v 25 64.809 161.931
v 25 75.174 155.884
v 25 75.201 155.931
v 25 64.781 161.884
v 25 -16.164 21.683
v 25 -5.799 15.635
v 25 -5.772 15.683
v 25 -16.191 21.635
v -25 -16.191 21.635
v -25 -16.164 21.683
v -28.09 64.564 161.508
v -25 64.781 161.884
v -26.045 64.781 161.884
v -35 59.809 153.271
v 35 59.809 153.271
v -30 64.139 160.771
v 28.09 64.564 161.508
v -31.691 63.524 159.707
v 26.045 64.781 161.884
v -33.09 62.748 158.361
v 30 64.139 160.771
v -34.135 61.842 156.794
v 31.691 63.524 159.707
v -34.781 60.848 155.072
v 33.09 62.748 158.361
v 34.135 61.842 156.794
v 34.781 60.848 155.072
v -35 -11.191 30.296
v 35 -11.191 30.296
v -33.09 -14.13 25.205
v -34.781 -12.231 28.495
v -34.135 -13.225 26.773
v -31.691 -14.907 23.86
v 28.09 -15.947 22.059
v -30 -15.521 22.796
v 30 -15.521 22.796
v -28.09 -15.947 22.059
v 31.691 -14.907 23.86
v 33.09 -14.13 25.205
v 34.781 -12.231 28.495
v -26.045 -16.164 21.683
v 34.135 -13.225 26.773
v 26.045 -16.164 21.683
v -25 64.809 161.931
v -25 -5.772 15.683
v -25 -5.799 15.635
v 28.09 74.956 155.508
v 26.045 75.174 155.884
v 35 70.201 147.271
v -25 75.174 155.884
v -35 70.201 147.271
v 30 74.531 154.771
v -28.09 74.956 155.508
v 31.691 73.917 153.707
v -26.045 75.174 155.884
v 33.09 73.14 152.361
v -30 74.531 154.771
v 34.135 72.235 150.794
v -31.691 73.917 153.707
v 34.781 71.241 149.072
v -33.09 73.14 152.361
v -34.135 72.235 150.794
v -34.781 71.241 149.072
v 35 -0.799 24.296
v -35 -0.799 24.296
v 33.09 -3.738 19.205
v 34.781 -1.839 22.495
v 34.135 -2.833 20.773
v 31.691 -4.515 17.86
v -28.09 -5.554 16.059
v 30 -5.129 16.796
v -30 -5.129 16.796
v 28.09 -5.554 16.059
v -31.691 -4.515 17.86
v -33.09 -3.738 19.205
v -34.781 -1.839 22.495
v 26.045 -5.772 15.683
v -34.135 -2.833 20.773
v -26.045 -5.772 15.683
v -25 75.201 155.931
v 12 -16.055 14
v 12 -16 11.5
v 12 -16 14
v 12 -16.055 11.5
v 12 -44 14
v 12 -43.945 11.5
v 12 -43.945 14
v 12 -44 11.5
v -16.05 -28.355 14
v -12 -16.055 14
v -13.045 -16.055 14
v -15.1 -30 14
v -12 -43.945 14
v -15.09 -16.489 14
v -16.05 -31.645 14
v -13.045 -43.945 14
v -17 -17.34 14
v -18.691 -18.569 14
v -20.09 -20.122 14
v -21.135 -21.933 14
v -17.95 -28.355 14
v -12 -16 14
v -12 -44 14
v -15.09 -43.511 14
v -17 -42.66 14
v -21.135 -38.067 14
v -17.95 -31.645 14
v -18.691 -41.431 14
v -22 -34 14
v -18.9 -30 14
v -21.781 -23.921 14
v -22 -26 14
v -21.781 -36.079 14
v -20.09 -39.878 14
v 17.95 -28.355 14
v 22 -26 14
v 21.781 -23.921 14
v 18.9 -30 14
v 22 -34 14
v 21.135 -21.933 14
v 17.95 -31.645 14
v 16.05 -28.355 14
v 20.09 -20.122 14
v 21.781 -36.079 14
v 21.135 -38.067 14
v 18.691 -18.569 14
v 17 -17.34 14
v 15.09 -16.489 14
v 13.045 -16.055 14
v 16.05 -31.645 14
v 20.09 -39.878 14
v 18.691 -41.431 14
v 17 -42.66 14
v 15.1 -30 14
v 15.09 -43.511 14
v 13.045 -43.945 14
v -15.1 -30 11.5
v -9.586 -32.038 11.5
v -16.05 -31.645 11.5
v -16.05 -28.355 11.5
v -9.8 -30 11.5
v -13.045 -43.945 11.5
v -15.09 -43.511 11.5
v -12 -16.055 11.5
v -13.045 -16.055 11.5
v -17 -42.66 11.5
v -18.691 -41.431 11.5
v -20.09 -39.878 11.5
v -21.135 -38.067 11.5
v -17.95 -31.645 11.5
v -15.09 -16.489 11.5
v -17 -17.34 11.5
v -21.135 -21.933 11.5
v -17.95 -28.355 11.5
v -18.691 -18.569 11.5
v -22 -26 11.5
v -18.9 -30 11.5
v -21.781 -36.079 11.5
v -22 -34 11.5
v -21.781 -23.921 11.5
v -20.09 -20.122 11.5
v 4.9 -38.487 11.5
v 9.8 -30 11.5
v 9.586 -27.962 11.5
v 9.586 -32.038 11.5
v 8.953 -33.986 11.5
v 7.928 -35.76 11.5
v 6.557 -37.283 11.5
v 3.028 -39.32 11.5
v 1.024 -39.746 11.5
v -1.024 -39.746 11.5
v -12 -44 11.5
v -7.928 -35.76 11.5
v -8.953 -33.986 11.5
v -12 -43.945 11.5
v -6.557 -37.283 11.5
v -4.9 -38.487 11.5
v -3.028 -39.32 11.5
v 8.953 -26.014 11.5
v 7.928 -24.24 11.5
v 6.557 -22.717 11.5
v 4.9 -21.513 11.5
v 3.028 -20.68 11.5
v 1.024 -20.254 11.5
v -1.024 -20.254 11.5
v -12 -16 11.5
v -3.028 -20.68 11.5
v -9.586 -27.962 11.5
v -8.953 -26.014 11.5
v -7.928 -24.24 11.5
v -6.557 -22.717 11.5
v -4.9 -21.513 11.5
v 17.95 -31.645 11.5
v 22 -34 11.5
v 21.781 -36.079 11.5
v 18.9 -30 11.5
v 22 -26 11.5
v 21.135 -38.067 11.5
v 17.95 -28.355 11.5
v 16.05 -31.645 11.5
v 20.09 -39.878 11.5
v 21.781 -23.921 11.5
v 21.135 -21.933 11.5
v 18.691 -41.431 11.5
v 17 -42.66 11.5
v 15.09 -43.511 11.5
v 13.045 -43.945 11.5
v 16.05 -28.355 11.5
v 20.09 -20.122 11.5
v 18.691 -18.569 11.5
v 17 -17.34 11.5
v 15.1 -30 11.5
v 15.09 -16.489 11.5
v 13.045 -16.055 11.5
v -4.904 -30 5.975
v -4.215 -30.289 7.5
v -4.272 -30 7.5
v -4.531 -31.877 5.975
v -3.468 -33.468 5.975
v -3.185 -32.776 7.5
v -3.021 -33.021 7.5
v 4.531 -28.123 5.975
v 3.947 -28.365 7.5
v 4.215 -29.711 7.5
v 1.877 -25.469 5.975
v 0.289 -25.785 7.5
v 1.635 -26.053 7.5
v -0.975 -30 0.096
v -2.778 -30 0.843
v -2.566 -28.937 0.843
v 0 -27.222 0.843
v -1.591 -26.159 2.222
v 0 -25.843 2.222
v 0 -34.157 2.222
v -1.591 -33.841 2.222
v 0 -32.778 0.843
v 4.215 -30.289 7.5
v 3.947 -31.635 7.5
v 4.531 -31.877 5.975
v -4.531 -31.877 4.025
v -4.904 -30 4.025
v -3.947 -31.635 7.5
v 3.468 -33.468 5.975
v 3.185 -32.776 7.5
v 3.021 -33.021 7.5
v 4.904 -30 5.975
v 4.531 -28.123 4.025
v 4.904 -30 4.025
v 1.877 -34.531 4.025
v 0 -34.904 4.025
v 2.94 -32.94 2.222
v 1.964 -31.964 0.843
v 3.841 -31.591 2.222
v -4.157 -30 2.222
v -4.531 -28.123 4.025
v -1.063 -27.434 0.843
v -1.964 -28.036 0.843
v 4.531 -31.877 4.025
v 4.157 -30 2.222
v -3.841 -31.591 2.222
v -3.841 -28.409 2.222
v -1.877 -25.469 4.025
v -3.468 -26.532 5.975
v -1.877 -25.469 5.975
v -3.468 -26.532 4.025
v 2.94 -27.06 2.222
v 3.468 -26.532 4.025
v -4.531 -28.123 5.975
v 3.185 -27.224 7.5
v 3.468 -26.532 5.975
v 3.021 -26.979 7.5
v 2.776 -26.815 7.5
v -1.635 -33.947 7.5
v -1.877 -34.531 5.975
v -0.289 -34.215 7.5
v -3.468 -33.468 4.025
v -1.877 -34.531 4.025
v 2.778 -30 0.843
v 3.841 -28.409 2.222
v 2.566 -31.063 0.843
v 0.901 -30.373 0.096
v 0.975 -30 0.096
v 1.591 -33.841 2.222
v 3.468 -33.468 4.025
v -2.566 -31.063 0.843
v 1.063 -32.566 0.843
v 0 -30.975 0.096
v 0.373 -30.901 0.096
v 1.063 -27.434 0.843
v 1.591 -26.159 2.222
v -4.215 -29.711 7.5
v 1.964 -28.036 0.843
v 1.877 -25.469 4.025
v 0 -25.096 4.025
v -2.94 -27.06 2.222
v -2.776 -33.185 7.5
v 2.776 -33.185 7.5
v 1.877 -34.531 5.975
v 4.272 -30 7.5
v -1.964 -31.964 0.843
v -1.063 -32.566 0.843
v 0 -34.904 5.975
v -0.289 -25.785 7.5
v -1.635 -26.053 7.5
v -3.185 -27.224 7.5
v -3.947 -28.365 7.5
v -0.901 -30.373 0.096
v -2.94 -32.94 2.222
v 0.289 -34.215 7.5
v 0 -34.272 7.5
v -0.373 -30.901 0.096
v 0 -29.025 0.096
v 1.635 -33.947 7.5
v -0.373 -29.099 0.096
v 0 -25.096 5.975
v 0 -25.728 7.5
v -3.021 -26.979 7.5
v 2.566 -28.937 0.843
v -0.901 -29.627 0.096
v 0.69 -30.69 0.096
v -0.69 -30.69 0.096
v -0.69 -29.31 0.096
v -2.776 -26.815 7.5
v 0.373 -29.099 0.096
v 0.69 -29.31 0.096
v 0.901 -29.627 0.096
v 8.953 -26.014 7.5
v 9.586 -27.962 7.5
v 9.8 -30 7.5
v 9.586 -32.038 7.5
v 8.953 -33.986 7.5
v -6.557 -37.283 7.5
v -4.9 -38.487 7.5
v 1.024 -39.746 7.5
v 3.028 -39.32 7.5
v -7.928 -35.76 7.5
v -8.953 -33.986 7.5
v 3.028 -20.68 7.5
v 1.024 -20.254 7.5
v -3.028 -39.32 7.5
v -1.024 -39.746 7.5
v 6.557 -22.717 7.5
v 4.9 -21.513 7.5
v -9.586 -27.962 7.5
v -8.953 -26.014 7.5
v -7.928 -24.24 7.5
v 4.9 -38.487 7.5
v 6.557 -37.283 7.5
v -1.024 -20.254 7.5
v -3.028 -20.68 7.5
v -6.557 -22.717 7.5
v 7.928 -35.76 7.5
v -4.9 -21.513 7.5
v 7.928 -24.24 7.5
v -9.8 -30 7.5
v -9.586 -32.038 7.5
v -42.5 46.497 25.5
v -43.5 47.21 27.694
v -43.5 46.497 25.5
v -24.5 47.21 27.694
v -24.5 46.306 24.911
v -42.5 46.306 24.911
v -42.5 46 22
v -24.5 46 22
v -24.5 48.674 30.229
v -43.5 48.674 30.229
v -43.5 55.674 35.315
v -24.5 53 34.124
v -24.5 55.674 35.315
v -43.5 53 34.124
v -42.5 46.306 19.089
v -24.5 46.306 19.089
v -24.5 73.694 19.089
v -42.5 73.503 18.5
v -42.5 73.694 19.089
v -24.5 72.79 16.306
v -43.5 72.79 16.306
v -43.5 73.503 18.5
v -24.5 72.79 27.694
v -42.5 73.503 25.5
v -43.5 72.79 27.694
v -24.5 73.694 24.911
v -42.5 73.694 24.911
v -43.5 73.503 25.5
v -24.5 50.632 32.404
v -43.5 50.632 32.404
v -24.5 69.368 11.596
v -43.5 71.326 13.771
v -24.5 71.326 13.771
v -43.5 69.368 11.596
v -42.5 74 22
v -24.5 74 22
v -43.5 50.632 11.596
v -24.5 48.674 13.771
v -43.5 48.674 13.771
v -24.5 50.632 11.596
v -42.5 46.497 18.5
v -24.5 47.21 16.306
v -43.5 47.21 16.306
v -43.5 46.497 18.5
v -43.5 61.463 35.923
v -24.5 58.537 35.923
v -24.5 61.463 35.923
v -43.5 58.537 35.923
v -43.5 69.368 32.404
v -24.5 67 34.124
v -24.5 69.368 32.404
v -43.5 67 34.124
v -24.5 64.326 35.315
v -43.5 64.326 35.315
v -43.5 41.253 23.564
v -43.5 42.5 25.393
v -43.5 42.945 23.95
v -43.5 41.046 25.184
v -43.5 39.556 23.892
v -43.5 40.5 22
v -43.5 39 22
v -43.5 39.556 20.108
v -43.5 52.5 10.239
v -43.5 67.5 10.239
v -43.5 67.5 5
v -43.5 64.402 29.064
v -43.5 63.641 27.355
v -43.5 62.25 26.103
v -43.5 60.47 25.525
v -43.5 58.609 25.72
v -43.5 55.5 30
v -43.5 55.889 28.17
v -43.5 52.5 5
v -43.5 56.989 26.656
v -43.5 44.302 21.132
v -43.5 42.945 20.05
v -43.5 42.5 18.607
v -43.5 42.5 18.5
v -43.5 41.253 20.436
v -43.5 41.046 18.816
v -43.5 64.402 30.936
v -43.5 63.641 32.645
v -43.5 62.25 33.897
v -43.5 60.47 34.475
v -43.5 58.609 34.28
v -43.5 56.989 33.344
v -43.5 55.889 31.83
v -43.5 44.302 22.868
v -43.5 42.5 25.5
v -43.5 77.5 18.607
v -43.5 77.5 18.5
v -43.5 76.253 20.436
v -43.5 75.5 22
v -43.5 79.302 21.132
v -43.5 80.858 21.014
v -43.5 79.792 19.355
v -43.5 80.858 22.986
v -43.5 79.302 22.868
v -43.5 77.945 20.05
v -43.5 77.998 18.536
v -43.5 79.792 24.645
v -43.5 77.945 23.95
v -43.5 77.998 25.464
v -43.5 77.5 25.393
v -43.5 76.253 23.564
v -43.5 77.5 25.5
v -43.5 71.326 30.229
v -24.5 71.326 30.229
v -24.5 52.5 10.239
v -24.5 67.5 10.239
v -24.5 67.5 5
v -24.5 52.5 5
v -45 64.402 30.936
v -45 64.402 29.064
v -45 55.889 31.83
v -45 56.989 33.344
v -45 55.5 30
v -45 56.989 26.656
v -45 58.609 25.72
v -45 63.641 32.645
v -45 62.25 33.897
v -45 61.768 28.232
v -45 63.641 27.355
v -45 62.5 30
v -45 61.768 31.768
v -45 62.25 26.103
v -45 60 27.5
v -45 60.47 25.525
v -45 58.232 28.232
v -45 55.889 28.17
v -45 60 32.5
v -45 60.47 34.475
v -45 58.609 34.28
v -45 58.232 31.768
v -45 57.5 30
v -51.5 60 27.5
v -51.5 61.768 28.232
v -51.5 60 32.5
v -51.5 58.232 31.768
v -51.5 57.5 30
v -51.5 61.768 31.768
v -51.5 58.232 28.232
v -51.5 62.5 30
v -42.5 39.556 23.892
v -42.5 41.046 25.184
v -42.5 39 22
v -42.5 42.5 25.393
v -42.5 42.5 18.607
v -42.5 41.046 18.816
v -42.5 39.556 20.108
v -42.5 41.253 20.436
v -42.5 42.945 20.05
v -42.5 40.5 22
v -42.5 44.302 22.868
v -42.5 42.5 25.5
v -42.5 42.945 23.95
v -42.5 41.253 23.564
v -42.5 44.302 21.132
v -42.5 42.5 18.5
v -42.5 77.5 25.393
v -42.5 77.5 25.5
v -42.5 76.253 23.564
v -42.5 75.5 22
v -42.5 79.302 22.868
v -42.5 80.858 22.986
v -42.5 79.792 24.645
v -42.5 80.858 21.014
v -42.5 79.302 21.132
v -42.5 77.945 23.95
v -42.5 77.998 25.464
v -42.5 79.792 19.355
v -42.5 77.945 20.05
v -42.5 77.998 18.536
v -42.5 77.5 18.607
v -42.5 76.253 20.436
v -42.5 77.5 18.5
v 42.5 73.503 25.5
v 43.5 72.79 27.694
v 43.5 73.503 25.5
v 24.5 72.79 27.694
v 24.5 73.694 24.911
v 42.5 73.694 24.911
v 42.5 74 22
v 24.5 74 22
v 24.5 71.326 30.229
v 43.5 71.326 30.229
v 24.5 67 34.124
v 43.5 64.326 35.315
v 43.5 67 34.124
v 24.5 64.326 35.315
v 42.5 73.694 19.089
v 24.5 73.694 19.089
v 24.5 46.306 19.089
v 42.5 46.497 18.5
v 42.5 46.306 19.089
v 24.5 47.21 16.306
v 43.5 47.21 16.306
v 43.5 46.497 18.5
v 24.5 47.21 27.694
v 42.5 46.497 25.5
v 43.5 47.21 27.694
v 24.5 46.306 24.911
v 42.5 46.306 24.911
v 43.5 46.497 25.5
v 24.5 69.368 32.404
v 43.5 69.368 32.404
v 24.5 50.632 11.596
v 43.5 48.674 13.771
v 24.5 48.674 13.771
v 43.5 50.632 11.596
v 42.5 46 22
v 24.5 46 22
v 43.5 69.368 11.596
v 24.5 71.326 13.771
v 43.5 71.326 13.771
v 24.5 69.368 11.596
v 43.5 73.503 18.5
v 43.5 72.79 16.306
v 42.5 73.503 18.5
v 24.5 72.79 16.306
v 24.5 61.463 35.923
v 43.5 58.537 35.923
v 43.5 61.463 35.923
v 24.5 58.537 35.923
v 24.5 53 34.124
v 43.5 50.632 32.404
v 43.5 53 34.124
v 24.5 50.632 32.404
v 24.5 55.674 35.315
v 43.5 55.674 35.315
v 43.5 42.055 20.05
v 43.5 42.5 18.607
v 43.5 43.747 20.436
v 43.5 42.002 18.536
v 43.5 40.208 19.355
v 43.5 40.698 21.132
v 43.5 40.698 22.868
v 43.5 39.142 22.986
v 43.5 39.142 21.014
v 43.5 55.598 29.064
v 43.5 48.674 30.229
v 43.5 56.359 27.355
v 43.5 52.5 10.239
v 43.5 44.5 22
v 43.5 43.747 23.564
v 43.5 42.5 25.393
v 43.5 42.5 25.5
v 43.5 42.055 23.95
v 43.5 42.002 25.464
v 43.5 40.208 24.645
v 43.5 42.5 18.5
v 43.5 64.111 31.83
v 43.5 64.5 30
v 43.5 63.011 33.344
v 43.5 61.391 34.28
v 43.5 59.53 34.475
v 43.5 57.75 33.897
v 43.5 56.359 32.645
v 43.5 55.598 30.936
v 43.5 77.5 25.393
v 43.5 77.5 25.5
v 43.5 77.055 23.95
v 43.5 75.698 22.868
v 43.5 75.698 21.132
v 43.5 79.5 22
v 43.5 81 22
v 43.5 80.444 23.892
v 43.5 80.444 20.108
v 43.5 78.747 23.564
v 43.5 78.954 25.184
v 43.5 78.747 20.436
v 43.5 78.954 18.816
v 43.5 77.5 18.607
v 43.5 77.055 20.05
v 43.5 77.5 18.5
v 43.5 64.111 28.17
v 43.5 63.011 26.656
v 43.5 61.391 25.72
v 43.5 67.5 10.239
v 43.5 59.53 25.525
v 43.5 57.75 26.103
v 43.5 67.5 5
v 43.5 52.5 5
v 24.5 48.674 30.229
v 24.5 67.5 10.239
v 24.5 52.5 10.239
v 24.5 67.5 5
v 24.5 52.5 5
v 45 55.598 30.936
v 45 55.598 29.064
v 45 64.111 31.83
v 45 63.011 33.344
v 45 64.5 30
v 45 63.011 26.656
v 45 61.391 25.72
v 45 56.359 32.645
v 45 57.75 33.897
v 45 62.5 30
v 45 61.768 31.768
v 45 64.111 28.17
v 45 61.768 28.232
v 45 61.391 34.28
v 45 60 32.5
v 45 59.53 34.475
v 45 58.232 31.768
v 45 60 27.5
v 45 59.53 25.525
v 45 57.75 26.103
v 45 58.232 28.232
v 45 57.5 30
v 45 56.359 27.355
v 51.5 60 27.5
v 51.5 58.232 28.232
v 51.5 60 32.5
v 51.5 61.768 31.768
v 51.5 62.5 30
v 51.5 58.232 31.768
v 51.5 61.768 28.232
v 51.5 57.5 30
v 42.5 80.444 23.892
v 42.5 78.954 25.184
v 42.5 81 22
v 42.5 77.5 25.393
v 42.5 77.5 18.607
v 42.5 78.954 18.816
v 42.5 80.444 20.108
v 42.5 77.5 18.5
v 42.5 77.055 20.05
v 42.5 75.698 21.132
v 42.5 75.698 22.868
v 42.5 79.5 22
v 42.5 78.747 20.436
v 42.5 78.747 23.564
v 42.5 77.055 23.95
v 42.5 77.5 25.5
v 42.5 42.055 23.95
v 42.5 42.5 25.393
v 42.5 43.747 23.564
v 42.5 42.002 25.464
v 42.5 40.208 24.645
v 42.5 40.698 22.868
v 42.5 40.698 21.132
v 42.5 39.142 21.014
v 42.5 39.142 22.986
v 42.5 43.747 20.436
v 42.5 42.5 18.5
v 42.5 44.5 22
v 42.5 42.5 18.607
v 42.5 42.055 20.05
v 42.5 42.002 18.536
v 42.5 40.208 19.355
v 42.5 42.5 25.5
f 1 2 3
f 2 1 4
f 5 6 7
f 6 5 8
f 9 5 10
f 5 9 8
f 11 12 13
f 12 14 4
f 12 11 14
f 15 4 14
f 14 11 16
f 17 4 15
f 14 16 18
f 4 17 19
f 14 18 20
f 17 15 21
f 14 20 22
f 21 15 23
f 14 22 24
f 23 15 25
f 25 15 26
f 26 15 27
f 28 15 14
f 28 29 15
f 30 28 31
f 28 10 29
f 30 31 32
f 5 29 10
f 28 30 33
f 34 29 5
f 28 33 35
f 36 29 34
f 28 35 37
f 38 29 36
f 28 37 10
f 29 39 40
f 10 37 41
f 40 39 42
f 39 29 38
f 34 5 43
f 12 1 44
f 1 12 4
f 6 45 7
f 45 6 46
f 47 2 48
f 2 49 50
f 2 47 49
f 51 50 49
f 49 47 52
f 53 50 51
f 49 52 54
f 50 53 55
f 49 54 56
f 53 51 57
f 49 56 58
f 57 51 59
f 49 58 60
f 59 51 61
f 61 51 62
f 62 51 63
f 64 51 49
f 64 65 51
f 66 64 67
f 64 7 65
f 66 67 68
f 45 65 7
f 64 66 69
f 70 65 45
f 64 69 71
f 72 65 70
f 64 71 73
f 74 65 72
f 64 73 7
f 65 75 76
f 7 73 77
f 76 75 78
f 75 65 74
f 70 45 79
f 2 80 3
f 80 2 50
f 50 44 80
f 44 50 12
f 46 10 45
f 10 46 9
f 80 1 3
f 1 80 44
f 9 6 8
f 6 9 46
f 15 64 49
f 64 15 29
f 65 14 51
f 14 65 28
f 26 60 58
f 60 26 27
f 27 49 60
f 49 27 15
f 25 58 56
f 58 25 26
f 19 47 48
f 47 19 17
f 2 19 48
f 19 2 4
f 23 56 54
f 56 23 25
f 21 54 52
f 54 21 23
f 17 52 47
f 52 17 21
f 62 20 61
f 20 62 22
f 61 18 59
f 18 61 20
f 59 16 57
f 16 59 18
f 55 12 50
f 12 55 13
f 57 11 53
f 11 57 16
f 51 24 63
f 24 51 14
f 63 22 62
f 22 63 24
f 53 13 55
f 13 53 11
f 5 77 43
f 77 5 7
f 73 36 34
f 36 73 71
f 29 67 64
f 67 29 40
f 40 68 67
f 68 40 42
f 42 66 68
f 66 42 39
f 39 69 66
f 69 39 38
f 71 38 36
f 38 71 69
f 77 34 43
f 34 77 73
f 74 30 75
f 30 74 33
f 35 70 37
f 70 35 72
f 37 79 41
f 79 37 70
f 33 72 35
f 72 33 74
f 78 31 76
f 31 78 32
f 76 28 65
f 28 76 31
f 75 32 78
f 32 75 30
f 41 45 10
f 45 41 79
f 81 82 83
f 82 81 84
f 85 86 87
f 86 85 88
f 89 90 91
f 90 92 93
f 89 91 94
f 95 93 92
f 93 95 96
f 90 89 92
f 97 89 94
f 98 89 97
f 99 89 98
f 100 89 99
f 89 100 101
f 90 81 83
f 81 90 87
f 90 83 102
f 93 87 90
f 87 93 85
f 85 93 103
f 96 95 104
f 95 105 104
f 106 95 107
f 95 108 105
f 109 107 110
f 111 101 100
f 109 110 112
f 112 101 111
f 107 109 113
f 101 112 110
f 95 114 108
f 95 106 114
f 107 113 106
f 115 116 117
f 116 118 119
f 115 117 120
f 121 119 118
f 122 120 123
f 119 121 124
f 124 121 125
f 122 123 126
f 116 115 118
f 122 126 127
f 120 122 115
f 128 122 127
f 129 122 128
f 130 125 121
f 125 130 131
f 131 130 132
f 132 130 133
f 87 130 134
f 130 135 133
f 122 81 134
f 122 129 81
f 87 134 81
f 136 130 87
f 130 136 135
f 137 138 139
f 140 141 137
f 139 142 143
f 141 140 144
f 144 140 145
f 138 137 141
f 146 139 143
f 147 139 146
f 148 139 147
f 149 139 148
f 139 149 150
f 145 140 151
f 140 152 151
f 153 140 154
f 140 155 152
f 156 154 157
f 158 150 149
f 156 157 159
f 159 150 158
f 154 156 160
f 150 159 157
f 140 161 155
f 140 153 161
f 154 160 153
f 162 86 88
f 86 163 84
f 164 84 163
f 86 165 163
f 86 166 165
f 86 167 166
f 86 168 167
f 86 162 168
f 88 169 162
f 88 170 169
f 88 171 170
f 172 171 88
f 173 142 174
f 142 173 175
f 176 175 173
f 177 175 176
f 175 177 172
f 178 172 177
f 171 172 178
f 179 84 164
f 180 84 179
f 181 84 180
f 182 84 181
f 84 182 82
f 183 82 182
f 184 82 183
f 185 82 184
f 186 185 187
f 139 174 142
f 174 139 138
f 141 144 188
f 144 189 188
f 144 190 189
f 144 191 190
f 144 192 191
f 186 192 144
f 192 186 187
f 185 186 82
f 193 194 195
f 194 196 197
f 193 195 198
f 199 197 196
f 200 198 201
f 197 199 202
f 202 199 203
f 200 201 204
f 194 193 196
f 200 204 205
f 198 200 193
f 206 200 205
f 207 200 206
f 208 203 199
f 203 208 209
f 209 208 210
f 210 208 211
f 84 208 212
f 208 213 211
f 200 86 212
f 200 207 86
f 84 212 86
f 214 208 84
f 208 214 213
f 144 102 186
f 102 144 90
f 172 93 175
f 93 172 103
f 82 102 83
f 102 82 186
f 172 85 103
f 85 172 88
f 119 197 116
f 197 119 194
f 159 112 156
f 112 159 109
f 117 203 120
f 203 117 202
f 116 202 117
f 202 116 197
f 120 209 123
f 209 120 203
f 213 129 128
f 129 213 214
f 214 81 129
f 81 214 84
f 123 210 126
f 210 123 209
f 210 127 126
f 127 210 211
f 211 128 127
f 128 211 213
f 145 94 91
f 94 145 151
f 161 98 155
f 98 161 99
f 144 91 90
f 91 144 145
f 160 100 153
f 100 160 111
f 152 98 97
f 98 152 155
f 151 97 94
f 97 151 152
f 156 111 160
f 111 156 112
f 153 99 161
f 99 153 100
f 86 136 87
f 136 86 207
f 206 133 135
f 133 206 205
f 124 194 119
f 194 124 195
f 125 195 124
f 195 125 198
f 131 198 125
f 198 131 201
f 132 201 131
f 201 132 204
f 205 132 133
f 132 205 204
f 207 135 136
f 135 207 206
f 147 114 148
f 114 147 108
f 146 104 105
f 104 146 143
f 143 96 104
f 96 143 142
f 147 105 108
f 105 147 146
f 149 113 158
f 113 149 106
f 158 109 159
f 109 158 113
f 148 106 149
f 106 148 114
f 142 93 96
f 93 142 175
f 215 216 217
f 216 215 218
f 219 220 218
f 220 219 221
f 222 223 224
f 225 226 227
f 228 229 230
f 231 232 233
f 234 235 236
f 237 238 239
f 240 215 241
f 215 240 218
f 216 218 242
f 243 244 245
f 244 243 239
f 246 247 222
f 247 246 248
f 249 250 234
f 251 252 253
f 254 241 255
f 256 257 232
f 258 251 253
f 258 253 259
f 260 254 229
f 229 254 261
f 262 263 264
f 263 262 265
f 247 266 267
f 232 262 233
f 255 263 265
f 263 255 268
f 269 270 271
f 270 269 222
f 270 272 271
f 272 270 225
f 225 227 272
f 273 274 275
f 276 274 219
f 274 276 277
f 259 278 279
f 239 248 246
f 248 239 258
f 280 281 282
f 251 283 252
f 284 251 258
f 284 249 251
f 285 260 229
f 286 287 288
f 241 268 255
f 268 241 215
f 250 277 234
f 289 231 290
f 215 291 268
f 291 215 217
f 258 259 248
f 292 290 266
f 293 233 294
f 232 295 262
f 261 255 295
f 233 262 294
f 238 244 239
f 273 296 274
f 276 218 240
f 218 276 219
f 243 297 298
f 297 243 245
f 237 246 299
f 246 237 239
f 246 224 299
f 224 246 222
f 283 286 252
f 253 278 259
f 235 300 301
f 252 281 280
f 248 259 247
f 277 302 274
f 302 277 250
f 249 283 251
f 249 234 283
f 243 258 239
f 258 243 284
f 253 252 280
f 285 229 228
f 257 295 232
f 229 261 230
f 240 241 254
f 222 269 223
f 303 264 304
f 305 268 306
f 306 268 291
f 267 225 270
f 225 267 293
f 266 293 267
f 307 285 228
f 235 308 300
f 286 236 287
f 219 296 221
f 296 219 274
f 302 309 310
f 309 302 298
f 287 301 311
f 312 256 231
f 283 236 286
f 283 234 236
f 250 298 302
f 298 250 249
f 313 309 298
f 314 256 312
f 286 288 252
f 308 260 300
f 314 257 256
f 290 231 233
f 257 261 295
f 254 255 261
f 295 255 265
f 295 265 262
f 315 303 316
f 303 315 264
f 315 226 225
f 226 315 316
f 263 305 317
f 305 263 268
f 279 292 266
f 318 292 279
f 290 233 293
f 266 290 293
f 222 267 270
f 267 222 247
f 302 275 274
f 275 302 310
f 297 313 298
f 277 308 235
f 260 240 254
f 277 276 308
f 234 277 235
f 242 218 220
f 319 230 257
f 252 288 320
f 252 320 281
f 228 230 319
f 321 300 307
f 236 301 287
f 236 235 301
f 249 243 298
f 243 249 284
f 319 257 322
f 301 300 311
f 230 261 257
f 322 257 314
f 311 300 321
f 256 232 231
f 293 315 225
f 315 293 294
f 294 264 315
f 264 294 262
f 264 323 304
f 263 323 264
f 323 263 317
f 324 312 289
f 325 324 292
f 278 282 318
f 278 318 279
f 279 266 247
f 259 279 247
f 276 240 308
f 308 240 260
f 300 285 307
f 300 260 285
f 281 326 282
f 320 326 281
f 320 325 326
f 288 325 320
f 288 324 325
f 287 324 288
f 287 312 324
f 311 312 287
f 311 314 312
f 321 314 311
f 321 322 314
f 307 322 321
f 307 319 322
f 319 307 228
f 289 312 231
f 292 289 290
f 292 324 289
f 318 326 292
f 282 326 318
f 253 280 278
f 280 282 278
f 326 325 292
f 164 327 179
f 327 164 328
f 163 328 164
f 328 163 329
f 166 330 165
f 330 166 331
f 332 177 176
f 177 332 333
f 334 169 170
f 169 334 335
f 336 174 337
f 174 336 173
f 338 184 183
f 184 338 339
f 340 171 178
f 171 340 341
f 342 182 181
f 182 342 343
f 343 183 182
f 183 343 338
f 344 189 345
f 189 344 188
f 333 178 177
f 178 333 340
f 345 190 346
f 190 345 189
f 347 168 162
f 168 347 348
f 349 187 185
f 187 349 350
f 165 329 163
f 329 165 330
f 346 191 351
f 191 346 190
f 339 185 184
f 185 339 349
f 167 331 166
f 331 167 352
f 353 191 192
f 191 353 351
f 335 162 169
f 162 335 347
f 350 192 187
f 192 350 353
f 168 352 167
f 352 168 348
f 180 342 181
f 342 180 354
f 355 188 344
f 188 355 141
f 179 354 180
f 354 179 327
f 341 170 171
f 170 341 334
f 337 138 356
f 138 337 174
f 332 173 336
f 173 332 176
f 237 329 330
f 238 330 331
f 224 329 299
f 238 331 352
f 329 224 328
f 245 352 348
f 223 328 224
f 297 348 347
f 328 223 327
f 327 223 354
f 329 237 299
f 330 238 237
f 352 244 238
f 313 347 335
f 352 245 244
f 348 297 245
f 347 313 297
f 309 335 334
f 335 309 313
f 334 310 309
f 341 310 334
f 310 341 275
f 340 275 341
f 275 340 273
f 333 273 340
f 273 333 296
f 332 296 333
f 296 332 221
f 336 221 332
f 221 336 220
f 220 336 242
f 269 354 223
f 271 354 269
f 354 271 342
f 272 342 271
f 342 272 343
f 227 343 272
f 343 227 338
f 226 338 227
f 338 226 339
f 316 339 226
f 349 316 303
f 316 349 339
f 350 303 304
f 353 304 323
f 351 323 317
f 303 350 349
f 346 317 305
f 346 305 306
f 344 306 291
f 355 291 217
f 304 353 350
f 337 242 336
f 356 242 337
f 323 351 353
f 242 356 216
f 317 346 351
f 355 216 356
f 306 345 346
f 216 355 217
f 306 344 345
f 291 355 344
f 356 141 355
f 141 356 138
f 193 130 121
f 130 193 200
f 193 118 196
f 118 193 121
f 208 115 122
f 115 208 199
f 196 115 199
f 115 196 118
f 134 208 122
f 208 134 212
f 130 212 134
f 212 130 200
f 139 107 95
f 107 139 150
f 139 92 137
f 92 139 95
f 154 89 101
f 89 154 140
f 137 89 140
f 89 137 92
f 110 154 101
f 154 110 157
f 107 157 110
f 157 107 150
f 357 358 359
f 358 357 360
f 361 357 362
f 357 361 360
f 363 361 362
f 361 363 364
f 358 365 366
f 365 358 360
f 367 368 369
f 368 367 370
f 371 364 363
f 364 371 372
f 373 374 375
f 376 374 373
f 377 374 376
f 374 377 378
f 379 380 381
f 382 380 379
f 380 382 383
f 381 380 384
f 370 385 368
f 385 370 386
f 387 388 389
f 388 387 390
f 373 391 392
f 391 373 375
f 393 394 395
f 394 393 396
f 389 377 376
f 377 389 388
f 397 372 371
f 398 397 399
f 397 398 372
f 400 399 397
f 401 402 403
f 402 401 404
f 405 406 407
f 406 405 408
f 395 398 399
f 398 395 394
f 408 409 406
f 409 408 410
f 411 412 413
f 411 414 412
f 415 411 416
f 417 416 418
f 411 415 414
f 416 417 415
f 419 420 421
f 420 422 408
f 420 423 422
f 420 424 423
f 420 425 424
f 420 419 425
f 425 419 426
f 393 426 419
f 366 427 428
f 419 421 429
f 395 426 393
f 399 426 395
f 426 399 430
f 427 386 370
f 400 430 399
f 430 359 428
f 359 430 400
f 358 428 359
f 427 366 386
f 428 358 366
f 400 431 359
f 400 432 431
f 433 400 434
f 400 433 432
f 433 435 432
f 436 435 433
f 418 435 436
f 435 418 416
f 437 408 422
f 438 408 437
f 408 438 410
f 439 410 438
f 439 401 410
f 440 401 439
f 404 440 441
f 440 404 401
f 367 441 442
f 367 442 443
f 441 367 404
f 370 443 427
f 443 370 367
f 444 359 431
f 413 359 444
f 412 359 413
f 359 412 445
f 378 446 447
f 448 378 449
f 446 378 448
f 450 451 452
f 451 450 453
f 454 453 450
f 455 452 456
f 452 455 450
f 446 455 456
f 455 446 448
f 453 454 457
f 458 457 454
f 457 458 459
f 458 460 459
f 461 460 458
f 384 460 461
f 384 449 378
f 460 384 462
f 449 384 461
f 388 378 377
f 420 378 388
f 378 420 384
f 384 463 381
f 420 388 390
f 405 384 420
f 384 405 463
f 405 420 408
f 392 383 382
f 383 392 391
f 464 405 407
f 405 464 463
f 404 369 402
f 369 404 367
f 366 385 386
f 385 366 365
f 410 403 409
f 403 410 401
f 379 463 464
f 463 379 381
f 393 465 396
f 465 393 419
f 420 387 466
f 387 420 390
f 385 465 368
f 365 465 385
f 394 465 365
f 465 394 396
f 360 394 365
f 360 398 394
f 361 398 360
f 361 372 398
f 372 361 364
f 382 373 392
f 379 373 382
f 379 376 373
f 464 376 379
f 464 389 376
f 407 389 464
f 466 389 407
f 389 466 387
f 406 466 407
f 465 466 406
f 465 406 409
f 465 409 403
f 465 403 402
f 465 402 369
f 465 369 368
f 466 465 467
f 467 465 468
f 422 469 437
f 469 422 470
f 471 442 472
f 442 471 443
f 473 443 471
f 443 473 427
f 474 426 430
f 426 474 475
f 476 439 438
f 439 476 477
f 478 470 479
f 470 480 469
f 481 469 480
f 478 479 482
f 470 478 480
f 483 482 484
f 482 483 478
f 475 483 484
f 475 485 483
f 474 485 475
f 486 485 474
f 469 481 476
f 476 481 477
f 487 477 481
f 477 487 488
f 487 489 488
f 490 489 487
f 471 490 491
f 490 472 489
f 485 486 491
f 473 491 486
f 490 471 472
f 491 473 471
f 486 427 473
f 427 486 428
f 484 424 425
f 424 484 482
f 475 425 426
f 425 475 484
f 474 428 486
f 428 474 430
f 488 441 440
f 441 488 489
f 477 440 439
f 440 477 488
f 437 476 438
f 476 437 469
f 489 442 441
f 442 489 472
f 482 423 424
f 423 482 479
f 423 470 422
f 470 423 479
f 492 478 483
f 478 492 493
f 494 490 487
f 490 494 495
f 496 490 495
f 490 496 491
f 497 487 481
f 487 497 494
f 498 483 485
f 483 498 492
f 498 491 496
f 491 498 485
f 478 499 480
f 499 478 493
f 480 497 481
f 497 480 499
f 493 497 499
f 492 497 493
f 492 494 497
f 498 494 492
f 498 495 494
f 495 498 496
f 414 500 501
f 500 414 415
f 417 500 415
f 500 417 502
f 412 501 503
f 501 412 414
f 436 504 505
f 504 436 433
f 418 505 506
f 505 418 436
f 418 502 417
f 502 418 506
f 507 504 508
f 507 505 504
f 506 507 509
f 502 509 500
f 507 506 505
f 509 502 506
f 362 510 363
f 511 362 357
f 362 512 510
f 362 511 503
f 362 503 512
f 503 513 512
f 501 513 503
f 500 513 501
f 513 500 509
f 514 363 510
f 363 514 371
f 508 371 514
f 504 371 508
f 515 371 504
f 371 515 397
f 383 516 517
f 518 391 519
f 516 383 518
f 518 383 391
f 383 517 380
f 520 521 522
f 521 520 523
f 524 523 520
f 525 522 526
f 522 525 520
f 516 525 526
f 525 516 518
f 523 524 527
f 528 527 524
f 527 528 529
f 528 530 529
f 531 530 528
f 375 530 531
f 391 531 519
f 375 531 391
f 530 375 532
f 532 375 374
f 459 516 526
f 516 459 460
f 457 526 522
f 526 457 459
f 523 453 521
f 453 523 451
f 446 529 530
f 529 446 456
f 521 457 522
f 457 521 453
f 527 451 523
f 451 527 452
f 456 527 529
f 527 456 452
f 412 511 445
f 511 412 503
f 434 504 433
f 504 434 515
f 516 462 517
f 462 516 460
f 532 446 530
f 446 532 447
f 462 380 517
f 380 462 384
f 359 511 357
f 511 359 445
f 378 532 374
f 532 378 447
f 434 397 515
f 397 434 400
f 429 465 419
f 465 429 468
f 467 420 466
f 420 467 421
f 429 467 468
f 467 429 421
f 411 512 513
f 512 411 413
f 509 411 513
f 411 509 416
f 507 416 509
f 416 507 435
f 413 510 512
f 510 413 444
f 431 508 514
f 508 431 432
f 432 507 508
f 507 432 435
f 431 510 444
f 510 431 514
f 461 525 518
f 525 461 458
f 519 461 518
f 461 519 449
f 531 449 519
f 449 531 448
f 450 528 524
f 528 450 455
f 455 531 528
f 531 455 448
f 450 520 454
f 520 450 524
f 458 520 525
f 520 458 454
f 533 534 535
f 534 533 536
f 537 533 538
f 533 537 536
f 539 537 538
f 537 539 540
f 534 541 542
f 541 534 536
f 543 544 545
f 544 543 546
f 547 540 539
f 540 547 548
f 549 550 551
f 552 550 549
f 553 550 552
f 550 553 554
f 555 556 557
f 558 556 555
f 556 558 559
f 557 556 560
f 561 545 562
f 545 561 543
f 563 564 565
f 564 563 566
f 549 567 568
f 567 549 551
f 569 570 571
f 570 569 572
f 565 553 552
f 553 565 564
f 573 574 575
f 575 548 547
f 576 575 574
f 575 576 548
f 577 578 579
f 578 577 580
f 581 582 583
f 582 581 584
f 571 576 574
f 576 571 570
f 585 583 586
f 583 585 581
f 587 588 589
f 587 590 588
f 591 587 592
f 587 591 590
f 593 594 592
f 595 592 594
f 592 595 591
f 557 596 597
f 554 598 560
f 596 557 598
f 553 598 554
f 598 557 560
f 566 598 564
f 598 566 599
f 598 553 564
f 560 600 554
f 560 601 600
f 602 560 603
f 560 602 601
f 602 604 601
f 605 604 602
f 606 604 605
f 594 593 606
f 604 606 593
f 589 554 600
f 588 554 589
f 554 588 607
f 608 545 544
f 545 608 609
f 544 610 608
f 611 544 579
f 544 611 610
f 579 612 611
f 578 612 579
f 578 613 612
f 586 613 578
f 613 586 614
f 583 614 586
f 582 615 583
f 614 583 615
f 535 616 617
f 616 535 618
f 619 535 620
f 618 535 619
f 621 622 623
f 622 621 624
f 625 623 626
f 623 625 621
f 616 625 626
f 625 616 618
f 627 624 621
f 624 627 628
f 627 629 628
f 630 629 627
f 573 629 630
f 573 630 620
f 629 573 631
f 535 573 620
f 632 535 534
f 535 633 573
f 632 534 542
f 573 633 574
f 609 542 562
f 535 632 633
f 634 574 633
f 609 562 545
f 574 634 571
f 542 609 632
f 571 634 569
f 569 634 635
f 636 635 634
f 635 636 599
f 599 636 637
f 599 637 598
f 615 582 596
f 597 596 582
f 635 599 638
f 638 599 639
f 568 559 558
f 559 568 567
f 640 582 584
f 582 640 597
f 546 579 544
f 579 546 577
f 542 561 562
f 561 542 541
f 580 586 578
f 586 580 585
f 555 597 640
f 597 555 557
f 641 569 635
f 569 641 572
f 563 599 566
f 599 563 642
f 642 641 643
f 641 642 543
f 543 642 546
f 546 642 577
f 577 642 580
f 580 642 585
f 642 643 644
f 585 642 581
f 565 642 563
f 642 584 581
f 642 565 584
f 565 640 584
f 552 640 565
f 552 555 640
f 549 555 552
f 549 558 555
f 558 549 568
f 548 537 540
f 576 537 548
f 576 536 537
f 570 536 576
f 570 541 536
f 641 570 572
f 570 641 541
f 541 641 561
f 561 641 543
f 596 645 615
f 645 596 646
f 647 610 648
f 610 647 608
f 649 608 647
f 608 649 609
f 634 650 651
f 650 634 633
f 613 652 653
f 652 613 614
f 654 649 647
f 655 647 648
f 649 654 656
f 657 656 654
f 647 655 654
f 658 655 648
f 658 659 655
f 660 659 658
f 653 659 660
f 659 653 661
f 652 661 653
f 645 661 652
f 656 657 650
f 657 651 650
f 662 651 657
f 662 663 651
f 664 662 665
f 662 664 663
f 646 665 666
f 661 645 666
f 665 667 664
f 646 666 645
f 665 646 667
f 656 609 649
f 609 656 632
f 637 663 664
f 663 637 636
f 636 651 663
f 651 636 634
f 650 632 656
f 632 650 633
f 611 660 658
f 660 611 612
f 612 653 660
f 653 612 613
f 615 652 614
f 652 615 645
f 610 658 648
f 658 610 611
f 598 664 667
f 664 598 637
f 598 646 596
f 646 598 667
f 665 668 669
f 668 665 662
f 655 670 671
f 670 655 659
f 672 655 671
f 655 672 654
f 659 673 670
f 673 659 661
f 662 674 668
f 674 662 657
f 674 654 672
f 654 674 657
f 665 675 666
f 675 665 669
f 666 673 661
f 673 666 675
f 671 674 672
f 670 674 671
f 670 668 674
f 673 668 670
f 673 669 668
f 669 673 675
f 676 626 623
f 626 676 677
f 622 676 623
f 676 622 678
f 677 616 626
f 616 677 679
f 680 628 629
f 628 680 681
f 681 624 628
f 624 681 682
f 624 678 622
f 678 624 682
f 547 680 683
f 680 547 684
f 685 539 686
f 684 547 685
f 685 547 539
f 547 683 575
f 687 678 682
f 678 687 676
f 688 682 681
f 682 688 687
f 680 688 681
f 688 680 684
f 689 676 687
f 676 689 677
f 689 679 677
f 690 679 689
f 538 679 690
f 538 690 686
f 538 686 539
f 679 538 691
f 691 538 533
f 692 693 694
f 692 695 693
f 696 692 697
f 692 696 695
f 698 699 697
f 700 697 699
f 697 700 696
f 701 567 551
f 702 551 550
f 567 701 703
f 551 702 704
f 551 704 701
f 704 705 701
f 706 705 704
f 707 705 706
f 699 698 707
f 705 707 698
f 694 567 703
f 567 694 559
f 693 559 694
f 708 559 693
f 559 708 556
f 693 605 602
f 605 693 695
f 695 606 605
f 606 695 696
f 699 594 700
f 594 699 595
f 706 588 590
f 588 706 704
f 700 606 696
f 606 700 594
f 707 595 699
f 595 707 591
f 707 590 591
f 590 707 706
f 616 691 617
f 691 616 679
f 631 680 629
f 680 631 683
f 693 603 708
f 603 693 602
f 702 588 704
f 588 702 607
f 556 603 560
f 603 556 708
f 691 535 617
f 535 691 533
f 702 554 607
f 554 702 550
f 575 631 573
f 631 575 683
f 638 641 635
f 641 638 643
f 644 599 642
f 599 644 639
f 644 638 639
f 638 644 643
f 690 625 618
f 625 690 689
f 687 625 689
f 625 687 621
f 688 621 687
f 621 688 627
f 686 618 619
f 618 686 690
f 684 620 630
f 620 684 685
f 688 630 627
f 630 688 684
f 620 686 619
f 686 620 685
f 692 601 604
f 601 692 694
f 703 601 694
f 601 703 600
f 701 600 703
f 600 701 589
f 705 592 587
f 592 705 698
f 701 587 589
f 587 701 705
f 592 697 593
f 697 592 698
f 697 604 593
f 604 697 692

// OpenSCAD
 // centered rounded rect
 module roundedrect(x,y,r,t) {
   ix = x/2 - r;
   iy = y/2 - r;
   union() {
    translate([0,0,0]) cube([x-r*2,y,t], center=true);
    translate([0,0,0]) cube([x,y-r*2,t], center=true);
    translate([ix,iy,0]) cylinder(r=r,h=t, center=true);
    translate([-ix,iy,0]) cylinder(r=r,h=t, center=true);
    translate([ix,-iy,0]) cylinder(r=r,h=t, center=true);
    translate([-ix,-iy,0]) cylinder(r=r,h=t, center=true);
   }
 }
 
 module phone() { 
     offset = -35;
 color("#F80") linear_extrude(height=3,center=true) translate([-46,offset]) import_dxf("bot_phoneholder.dxf");
     color("#8FF") translate([0,87+offset,6+1.5]) roundedrect(70,162,10,12); // 80,162
     color("#F80") translate([-43,offset+4.5,11.5]) rotate([-90,0,0]) linear_extrude(height=3,center=true) import_dxf("bot_phonebase.dxf");
 }
 
 module castorholder() { 
 color("#F80") linear_extrude(height=3,center=true) translate([-46,-15]) import_dxf("bot_castorholder.dxf");
 }
 
module side() { 
 linear_extrude(height=3,center=true) translate([0,0]) import_dxf("bot_side.dxf");
}
 
module wheel() { 
 color("#FF0") linear_extrude(height=3,center=true) translate([-30,-30]) import_dxf("bot_wheel.dxf");
}

module castor() { // descends 14mm
  color("#FF8") difference() {
   union() {
    translate([0,0,-1.25]) roundedrect(44,28, 10, 2.5);
    translate([0,0,5-14]) sphere(r=5);
       translate([0,0,-4]) cylinder(r=19.6/2,h=5,center=true);
   }; union() {
    translate([34/2,0,0]) cylinder(r=3.8/2,h=5, center=true); // 3.8mm holes
    translate([-34/2,0,0]) cylinder(r=3.8/2, h=5, center=true);
   }
  }
}
 
module stepper() {
  color("#F00") translate([0,-8,-19]) difference() { union() {
    cylinder(r=28/2, h=19);
    translate([0,8,19]) cylinder(r=9/2, h=1.5);
    translate([0,8,19]) cylinder(r=5/2, h=8);   // shaft
    translate([35/2,0,18]) cylinder(r=7/2, h=1);
    translate([-35/2,0,18]) cylinder(r=7/2, h=1);
    translate([0,0,18.5]) cube([35,7,1],center=true);
    translate([0,-14,19/2]) cube([15,6,19],center=true);
  }; union() {
    translate([35/2,0,17]) cylinder(r=4/2, h=3);
    translate([-35/2,0,17]) cylinder(r=4/2, h=3);
  }
  }
}

translate([0,10,40]) rotate([60,0,0]) phone();
//translate([0,10,30]) cube([120,2,2],center=true); // pivot
 

//translate([45,0,0]) rotate([90,0,90]) side();
translate([-45,0,0])  rotate([90,0,90]) side();
 

translate([0,-30,14])  castor();
translate([0,-30,14+1.5]) castorholder();

WHEELX=60;
WHEELY=30;
translate([-45+1.5,WHEELX,WHEELY]) rotate([90,0,-90])  stepper();
translate([45-1.5,WHEELX,WHEELY]) rotate([90,0,90])  stepper();
//translate([49,WHEELX,WHEELY])  rotate([90,0,90]) wheel();
translate([-49,WHEELX,WHEELY])  rotate([90,0,90]) wheel();


//roundedrect(80,162,10,12);
